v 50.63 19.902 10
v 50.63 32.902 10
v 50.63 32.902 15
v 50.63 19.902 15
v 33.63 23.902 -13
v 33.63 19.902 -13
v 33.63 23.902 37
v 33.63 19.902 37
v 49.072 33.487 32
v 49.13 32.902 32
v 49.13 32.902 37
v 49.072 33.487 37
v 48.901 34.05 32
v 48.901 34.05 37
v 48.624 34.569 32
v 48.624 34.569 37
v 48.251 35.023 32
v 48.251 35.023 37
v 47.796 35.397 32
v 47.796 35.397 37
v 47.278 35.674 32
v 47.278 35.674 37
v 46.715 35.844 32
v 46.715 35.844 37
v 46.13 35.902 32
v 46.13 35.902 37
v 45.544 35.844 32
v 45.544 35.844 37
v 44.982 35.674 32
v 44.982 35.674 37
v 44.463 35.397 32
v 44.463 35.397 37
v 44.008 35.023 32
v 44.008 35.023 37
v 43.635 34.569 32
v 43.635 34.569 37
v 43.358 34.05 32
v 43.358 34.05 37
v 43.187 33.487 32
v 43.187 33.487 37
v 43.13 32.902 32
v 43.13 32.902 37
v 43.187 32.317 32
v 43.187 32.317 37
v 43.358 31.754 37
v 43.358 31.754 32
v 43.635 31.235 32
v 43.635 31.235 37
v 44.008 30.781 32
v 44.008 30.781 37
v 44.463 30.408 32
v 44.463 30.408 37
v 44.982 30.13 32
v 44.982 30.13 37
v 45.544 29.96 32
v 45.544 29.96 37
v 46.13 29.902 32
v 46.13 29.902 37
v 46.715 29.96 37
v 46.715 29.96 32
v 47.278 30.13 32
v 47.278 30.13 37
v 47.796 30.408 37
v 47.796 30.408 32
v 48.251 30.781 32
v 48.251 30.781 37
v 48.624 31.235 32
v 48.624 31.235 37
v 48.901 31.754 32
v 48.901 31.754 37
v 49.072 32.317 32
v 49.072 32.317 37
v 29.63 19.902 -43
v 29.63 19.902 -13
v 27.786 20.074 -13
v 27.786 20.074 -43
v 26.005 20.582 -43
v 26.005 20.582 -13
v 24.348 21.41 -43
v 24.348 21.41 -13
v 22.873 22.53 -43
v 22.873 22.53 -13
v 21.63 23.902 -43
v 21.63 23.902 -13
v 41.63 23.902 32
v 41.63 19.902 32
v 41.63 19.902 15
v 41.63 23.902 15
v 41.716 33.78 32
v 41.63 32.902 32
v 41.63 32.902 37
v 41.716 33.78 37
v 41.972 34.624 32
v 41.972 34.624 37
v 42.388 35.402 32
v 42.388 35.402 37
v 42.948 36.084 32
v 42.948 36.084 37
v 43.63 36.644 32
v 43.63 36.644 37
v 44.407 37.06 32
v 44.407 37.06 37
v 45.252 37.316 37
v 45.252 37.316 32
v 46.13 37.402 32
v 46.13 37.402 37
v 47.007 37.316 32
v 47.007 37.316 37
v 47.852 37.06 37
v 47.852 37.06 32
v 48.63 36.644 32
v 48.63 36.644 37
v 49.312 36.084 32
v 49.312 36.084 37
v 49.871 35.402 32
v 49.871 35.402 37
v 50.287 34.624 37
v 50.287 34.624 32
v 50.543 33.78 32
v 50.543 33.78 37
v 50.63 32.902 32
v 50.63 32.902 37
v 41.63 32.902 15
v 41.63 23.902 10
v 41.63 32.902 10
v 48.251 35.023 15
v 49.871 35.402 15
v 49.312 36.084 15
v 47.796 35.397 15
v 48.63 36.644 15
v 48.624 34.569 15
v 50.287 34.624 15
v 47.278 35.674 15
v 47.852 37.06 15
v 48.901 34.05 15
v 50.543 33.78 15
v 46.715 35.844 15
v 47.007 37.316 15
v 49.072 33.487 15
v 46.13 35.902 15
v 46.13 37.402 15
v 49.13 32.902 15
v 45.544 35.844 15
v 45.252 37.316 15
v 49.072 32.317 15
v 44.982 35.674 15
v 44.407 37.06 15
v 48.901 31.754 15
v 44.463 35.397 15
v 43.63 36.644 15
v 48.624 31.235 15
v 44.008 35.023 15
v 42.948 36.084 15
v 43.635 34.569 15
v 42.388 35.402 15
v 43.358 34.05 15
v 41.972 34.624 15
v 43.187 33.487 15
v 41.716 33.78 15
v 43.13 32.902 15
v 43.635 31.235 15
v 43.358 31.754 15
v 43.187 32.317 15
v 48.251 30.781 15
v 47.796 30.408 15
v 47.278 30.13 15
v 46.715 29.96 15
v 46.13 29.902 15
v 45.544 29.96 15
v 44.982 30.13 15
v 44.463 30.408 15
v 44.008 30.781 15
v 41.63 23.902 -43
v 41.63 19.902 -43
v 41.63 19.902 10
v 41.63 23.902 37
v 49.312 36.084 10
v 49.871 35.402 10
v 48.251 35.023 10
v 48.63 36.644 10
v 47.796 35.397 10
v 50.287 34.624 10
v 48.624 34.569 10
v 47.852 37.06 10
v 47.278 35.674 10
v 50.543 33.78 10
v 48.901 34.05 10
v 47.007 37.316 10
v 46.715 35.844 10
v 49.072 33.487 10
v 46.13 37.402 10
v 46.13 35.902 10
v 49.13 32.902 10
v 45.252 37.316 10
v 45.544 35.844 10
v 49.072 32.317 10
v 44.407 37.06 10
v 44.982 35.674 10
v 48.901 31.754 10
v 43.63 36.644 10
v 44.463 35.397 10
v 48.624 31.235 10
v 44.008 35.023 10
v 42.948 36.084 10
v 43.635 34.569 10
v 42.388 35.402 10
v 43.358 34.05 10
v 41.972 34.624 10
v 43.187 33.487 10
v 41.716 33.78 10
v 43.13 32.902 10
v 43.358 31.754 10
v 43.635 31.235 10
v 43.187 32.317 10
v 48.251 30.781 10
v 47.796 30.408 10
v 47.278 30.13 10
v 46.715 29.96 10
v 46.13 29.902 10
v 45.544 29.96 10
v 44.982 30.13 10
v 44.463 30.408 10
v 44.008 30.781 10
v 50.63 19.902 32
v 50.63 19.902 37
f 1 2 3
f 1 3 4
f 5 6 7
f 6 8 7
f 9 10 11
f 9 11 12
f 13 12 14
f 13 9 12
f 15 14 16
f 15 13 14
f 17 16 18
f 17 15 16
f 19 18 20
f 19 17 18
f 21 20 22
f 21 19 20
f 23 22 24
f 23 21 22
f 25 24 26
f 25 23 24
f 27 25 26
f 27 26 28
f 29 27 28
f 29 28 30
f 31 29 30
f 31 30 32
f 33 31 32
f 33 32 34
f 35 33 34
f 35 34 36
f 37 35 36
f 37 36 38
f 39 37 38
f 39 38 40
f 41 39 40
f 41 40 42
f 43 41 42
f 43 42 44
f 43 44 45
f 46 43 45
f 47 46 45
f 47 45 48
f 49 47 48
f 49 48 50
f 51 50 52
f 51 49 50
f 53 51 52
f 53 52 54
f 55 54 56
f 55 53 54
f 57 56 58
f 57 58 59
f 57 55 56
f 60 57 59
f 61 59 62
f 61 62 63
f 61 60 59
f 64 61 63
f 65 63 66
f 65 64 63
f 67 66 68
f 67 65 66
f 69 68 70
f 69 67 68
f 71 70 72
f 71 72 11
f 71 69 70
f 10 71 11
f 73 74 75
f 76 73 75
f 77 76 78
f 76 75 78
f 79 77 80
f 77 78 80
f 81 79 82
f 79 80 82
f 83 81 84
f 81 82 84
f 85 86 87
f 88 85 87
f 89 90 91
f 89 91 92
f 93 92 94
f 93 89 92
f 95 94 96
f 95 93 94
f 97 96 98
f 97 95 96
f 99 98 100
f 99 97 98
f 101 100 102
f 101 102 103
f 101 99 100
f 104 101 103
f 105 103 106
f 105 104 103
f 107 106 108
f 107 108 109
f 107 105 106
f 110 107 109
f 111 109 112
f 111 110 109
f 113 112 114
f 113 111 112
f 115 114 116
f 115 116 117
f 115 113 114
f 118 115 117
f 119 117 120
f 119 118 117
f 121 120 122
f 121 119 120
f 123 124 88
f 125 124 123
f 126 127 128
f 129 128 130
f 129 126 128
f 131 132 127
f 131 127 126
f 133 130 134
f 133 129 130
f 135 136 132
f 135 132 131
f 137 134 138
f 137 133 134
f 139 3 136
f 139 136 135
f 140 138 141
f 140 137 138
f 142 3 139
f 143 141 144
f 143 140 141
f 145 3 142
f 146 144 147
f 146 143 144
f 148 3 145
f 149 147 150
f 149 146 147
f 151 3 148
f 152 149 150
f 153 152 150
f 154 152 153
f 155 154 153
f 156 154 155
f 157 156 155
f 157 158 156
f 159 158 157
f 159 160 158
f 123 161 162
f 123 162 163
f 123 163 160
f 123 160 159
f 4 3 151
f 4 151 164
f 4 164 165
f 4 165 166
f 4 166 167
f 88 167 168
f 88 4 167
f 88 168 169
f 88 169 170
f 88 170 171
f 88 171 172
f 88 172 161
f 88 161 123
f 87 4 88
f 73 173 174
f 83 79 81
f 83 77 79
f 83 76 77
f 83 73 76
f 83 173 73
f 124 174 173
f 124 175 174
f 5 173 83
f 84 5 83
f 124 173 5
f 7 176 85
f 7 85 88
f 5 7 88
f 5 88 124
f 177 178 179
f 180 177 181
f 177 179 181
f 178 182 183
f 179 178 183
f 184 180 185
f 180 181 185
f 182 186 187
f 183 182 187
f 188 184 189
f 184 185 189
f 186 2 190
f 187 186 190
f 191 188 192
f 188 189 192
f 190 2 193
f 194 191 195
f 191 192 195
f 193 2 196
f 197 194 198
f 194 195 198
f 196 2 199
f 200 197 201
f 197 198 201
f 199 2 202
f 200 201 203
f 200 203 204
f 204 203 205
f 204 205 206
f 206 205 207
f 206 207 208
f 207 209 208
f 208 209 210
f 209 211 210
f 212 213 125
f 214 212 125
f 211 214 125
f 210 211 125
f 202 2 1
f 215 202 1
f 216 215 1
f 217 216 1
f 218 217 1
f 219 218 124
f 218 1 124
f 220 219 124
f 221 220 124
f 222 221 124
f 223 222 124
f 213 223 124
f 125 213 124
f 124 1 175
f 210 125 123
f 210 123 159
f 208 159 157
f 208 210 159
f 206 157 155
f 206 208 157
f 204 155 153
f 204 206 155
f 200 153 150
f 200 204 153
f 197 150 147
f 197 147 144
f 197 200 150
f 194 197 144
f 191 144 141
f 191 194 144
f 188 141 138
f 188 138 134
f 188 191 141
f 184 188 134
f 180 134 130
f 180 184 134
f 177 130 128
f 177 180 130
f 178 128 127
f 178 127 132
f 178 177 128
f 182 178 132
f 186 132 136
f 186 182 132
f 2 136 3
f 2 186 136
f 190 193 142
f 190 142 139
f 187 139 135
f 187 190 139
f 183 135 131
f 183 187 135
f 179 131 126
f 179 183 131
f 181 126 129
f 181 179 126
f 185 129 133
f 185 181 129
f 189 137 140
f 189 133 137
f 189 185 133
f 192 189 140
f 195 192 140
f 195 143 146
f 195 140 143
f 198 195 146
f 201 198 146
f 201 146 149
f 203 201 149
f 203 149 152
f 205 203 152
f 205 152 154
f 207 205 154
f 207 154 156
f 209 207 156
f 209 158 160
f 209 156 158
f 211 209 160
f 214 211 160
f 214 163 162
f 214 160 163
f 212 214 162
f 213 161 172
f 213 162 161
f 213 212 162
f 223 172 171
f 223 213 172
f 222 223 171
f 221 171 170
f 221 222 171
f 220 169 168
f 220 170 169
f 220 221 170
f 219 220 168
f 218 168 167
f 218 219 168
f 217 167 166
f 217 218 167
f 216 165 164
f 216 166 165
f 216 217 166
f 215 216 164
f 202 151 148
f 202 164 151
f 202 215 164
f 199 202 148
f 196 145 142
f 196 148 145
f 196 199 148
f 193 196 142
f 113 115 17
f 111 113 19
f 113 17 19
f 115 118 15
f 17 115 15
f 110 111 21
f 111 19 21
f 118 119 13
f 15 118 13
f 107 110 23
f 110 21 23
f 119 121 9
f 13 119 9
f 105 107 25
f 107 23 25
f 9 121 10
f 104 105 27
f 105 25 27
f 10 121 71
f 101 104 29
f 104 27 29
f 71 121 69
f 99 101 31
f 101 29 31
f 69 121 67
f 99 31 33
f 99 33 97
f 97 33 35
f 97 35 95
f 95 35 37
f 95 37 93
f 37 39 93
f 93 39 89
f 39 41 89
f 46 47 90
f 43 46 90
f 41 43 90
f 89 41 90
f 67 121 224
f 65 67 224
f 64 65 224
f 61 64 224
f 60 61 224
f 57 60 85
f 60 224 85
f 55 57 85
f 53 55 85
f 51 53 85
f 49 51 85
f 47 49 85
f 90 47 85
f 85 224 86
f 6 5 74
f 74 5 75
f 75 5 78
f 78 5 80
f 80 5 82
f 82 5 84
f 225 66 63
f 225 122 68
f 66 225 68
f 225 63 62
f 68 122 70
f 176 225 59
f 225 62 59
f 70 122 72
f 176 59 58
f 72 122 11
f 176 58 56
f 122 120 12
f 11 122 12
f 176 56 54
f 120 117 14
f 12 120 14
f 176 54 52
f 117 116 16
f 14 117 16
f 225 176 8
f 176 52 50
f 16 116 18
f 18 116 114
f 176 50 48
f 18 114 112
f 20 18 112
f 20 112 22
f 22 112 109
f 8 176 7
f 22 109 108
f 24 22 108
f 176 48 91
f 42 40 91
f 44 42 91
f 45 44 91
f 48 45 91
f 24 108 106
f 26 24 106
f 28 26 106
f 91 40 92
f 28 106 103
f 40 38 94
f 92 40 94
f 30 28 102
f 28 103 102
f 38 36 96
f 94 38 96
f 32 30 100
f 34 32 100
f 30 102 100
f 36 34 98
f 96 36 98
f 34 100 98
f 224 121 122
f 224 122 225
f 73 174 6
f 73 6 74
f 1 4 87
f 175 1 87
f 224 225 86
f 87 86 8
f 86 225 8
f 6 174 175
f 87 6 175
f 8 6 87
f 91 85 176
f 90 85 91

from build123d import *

# Parameters (mm, degrees)
SKETCH1_W           = 8
SKETCH1_H           = 4
SKETCH1_R           = 3
BOSS_EXTRUDE1_DEPTH = 37
SKETCH3_W           = 8
SKETCH3_H           = 4
BOSS_EXTRUDE2_DEPTH = 13
SKETCH4_W           = 20
SKETCH4_H           = 4
BOSS_EXTRUDE3_DEPTH = 30
FILLET1_R           = 10
SKETCH5_W           = 9
SKETCH5_H           = 10
SKETCH5_H_2         = 17
CUT_EXTRUDE1_DEPTH  = 19


with BuildPart() as part:
    # Sketch1 → Boss-Extrude1 (new body)
    # profile 1 of 2: a face of its own
    with BuildSketch(Plane.XY):
        with Locations((37.629567615, 21.902115813)):
            Rectangle(SKETCH1_W, SKETCH1_H)
    # profile 2 of 2: a face of its own
    with BuildSketch(Plane.XY):
        with BuildLine():
            ThreePointArc((41.629567615, 32.902115813), (46.129567615, 37.402115813), (50.629567615, 32.902115813))
            Line((50.629567615, 32.902115813), (50.629567615, 19.902115813))
            Line((50.629567615, 19.902115813), (41.629567615, 19.902115813))
            Line((41.629567615, 19.902115813), (41.629567615, 23.902115813))
            Line((41.629567615, 23.902115813), (41.629567615, 32.902115813))
        make_face()
        with Locations((46.129567615, 32.902115813)):
            Circle(SKETCH1_R, mode=Mode.SUBTRACT)
    extrude(amount=BOSS_EXTRUDE1_DEPTH)

    # Sketch3 → Boss-Extrude2 (add)
    with BuildSketch(Plane(origin=(0, 0, 0), x_dir=(-1, 0, 0), z_dir=(0, 0, -1))):
        with Locations((-37.629567615, 21.902115813)):
            Rectangle(SKETCH3_W, SKETCH3_H)
    extrude(amount=BOSS_EXTRUDE2_DEPTH)

    # Sketch4 → Boss-Extrude3 (add)
    with BuildSketch(Plane(origin=(0, 0, -13), x_dir=(-1, 0, 0), z_dir=(0, 0, -1))):
        with Locations((-31.629567615, 21.902115813)):
            Rectangle(SKETCH4_W, SKETCH4_H)
    extrude(amount=BOSS_EXTRUDE3_DEPTH)

    # Fillet1
    # the kernel refuses this fillet: 10 mm, written as the material it takes off along each edge
    with BuildSketch(Plane(origin=(21.629567615, 19.902115813, 7), x_dir=(1, 0, 0), z_dir=(0, 0, -1))) as fillet1_piece_1:
        with BuildLine():
            CenterArc((8, -10), FILLET1_R, 90, 53.130102354)
            Line((0, -4), (-0.16, -3.88))
            ThreePointArc((-0.16, -3.88), (-0.2, -2), (-0.2, 0))
            Line((-0.2, 0), (0, 0.2))
            Line((0, 0.2), (8, 0.2))
            Line((8, 0.2), (8, 0))
        make_face()
    extrude(amount=70, mode=Mode.SUBTRACT)

    # Sketch5 → Cut-Extrude1 (cut)
    with BuildSketch(Plane(origin=(0, 19.902115813, 0), x_dir=(-1, 0, 0), z_dir=(0, -1, 0))):
        with Locations((-46.129567615, -5)):
            Rectangle(SKETCH5_W, SKETCH5_H)
        with Locations((-46.129567615, -23.5)):
            Rectangle(SKETCH5_W, SKETCH5_H_2)
    extrude(amount=-CUT_EXTRUDE1_DEPTH, mode=Mode.SUBTRACT)


solid = part.part
